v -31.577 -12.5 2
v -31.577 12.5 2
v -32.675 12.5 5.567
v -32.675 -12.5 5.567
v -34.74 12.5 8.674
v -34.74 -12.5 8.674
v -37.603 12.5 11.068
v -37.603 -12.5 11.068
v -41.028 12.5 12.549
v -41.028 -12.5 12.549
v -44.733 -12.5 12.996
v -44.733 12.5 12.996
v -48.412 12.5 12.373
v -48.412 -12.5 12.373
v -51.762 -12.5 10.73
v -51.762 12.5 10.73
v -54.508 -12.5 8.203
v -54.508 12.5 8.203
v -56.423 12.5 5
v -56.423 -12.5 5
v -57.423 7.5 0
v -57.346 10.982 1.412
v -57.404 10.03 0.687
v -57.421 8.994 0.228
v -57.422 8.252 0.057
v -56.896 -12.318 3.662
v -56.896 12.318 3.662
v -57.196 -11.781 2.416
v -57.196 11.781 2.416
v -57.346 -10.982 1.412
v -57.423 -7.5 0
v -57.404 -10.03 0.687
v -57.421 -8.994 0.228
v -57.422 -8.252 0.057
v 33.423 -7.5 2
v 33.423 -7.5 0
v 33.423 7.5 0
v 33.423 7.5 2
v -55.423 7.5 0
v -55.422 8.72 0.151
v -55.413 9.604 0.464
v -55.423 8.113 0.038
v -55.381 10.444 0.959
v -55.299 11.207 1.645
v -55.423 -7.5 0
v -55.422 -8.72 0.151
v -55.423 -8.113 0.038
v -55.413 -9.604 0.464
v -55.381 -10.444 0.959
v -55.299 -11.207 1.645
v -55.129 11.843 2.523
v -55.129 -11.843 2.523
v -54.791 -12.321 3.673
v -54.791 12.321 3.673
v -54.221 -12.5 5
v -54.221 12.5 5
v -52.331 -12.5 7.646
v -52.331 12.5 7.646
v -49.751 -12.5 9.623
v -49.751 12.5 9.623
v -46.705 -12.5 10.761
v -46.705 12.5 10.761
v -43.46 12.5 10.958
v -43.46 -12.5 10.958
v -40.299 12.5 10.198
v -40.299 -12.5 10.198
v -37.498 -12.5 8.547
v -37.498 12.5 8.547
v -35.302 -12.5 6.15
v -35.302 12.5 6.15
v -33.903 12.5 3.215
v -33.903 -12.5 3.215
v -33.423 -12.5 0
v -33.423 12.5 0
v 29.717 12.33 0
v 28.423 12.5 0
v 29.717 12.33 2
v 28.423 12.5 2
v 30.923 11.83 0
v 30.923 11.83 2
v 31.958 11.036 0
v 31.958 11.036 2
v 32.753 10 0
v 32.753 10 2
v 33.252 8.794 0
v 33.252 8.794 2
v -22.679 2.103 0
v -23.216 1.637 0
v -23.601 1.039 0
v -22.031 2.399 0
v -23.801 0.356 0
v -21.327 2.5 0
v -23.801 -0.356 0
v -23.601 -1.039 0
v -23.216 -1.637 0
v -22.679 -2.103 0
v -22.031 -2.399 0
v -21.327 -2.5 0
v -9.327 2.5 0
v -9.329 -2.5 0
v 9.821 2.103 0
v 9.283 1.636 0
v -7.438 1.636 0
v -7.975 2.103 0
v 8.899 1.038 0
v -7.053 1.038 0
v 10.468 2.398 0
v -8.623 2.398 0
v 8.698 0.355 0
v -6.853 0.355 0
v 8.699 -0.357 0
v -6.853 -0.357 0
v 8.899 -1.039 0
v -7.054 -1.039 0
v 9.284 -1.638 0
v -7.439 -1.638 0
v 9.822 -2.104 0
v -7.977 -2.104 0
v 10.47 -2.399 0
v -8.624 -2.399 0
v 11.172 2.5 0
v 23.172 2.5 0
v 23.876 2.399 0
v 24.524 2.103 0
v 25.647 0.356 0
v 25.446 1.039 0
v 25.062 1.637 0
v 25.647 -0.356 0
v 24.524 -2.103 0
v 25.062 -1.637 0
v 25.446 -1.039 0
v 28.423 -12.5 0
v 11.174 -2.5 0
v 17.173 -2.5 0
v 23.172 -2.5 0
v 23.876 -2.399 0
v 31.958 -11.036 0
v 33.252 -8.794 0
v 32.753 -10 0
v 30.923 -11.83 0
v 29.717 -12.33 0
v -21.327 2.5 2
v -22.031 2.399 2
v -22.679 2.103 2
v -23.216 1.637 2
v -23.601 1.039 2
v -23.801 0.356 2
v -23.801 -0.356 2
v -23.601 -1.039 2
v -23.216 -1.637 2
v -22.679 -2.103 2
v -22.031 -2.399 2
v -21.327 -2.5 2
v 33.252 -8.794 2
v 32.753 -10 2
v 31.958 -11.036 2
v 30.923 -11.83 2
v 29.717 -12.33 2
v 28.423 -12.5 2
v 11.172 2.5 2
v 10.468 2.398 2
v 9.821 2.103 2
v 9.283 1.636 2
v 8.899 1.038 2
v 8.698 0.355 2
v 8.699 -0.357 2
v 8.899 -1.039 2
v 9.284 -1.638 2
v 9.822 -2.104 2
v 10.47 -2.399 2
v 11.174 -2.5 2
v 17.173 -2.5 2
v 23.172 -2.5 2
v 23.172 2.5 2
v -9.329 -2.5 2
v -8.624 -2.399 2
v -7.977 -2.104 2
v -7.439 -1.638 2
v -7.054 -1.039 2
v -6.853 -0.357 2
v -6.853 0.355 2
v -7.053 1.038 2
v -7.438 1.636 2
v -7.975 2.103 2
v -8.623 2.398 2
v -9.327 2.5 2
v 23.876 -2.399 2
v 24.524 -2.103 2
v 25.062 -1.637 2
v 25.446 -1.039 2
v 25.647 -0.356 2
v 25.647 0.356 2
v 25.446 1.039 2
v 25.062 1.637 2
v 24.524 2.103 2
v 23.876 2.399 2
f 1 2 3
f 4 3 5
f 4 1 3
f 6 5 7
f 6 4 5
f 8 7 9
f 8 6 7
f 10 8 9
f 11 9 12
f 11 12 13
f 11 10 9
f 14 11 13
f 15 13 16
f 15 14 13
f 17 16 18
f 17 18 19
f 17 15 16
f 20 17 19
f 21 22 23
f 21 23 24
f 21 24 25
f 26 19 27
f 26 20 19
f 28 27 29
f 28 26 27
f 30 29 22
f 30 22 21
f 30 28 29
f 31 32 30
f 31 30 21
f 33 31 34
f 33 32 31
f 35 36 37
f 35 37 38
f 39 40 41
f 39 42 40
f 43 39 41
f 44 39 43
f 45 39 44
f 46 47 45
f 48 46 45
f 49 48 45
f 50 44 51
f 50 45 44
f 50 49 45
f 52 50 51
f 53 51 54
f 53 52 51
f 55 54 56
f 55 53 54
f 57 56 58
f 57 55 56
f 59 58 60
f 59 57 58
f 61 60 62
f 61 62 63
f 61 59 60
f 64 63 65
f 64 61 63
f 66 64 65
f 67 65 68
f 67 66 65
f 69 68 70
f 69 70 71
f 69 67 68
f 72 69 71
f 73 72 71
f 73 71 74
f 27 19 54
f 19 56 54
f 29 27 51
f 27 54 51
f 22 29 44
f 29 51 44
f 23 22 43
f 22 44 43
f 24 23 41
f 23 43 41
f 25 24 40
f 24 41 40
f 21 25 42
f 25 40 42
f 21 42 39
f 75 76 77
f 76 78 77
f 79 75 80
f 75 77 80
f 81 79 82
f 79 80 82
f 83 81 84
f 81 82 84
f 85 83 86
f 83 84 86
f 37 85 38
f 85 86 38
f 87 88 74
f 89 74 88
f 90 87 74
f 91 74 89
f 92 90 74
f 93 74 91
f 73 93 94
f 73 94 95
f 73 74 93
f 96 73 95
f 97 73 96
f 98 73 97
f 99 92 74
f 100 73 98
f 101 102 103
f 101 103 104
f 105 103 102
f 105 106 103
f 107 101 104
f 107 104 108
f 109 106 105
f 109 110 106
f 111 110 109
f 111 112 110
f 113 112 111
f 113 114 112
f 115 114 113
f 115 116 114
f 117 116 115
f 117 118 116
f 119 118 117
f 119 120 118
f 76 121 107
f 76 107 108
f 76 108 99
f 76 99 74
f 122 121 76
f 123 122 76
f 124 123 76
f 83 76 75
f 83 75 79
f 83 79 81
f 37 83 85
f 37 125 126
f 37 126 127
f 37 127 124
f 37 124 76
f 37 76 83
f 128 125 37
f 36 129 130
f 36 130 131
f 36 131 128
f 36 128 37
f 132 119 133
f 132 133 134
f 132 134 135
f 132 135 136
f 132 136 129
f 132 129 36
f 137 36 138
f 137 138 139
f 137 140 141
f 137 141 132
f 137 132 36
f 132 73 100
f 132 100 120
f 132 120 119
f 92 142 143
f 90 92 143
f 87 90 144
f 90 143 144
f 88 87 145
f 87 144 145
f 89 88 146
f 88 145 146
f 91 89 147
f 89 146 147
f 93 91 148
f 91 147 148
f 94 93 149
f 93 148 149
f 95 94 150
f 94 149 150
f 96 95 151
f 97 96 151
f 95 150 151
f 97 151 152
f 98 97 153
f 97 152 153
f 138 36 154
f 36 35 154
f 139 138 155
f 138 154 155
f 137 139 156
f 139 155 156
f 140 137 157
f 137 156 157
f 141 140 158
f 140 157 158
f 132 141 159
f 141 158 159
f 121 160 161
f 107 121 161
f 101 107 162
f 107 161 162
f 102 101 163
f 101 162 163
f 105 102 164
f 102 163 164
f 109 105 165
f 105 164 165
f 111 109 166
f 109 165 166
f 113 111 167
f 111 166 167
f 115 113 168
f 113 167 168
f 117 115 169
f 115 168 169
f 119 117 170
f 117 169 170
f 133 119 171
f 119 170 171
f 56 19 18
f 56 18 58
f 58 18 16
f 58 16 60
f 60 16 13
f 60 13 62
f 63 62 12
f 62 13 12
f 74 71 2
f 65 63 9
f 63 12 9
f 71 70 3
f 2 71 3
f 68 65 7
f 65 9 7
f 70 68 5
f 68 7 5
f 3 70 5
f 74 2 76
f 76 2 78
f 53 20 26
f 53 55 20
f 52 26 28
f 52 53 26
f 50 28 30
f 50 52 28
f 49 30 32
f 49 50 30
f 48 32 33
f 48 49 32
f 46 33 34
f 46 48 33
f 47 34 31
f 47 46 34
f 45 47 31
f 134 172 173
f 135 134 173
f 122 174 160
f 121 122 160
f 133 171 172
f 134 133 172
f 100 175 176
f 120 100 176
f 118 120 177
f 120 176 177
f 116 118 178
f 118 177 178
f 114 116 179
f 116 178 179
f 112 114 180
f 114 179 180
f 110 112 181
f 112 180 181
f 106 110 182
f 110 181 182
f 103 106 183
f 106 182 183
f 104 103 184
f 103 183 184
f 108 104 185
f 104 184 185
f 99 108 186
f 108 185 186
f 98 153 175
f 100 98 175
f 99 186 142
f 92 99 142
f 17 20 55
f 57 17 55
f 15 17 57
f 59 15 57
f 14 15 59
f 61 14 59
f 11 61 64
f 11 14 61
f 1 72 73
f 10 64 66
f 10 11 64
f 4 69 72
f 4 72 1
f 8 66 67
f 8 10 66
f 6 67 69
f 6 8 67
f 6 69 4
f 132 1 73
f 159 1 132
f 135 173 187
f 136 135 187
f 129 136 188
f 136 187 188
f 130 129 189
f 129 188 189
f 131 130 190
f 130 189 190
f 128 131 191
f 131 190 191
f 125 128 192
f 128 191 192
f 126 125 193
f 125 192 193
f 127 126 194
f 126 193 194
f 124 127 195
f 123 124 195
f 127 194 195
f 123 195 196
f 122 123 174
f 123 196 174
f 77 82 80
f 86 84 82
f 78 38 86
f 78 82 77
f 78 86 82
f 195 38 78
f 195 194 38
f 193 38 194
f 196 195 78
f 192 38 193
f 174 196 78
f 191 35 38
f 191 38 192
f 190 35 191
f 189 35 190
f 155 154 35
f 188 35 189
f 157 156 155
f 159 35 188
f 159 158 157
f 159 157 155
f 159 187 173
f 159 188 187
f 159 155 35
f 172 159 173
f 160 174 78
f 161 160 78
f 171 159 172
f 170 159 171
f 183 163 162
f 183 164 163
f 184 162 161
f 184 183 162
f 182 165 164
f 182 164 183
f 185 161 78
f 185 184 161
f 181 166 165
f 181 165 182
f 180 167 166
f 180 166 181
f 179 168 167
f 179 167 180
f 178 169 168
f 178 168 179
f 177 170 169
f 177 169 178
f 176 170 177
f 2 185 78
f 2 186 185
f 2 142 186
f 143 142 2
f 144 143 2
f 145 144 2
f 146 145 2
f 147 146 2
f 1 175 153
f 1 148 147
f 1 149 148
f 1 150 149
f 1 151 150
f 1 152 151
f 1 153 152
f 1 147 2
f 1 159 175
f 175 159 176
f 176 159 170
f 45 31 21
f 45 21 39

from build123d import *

# Parameters (mm, degrees)
F1_DEPTH = 12.5
F3_DEPTH = 25
F4_R     = 5


# Not quite as in the source:
# - ends of sketch curves that miss each other by under 0.0002 mm in the source are joined


with BuildPart() as f1:
    # F0 (on Front) → F1 (new body, symmetric)
    with BuildSketch(Plane.XZ):
        with BuildLine():
            Line((-33.4226162893, 0), (33.4226162893, 0))
            Line((33.4226162893, 0), (33.4226162893, 2))
            Line((33.4226162893, 2), (-31.5773837107, 2))
            ThreePointArc((-31.5773837107, 2), (-45.4256059397, 12.9612503934), (-57.4226162893, 0))
            Line((-57.4226162893, 0), (-55.4226162893, 0))
            ThreePointArc((-55.4226162893, 0), (-44.4226162893, 11), (-33.4226162893, 0))
        make_face()
    extrude(amount=F1_DEPTH, both=True)

    # F2 (on face) → F3 (cut)
    with BuildSketch(Plane.XY.offset(2)):
        with BuildLine():
            Line((17.172143635, 2.5), (11.172143635, 2.5))
            ThreePointArc((11.172143635, 2.5), (8.6730891224, -0.0009453085), (11.1740342522, -2.4999998213))
            Line((11.1740342522, -2.4999998213), (17.1730889436, -2.5))
            Line((17.1730889436, -2.5), (17.172143635, 2.5))
        make_face()
        with BuildLine():
            Line((23.172143635, 2.5), (17.172143635, 2.5))
            Line((17.172143635, 2.5), (17.1730889436, -2.5))
            Line((17.1730889436, -2.5), (23.172143635, -2.5))
            ThreePointArc((23.172143635, -2.5), (25.672143635, 0), (23.172143635, 2.5))
        make_face()
        with BuildLine():
            ThreePointArc((-9.3288016735, -2.4999998213), (-6.8278565437, -0.0009453085), (-9.3269110564, 2.4999998213))
            Line((-9.3269110564, 2.4999998213), (-21.3269110564, 2.5))
            ThreePointArc((-21.3269110564, 2.5), (-23.8269110564, 0), (-21.3269110564, -2.5))
            Line((-21.3269110564, -2.5), (-9.3288016735, -2.4999998213))
        make_face()
    extrude(amount=-F3_DEPTH, mode=Mode.SUBTRACT)

    # F4
    f4_edges = [f1.edges().sort_by_distance(p)[0] for p in [
        (33.422616, 12.5, 1),
        (33.422616, -12.5, 1),
        (-56.422616, -12.5, 0),
        (-56.422616, 12.5, 0),
    ]]
    fillet(f4_edges, radius=F4_R)


solid = f1.part
